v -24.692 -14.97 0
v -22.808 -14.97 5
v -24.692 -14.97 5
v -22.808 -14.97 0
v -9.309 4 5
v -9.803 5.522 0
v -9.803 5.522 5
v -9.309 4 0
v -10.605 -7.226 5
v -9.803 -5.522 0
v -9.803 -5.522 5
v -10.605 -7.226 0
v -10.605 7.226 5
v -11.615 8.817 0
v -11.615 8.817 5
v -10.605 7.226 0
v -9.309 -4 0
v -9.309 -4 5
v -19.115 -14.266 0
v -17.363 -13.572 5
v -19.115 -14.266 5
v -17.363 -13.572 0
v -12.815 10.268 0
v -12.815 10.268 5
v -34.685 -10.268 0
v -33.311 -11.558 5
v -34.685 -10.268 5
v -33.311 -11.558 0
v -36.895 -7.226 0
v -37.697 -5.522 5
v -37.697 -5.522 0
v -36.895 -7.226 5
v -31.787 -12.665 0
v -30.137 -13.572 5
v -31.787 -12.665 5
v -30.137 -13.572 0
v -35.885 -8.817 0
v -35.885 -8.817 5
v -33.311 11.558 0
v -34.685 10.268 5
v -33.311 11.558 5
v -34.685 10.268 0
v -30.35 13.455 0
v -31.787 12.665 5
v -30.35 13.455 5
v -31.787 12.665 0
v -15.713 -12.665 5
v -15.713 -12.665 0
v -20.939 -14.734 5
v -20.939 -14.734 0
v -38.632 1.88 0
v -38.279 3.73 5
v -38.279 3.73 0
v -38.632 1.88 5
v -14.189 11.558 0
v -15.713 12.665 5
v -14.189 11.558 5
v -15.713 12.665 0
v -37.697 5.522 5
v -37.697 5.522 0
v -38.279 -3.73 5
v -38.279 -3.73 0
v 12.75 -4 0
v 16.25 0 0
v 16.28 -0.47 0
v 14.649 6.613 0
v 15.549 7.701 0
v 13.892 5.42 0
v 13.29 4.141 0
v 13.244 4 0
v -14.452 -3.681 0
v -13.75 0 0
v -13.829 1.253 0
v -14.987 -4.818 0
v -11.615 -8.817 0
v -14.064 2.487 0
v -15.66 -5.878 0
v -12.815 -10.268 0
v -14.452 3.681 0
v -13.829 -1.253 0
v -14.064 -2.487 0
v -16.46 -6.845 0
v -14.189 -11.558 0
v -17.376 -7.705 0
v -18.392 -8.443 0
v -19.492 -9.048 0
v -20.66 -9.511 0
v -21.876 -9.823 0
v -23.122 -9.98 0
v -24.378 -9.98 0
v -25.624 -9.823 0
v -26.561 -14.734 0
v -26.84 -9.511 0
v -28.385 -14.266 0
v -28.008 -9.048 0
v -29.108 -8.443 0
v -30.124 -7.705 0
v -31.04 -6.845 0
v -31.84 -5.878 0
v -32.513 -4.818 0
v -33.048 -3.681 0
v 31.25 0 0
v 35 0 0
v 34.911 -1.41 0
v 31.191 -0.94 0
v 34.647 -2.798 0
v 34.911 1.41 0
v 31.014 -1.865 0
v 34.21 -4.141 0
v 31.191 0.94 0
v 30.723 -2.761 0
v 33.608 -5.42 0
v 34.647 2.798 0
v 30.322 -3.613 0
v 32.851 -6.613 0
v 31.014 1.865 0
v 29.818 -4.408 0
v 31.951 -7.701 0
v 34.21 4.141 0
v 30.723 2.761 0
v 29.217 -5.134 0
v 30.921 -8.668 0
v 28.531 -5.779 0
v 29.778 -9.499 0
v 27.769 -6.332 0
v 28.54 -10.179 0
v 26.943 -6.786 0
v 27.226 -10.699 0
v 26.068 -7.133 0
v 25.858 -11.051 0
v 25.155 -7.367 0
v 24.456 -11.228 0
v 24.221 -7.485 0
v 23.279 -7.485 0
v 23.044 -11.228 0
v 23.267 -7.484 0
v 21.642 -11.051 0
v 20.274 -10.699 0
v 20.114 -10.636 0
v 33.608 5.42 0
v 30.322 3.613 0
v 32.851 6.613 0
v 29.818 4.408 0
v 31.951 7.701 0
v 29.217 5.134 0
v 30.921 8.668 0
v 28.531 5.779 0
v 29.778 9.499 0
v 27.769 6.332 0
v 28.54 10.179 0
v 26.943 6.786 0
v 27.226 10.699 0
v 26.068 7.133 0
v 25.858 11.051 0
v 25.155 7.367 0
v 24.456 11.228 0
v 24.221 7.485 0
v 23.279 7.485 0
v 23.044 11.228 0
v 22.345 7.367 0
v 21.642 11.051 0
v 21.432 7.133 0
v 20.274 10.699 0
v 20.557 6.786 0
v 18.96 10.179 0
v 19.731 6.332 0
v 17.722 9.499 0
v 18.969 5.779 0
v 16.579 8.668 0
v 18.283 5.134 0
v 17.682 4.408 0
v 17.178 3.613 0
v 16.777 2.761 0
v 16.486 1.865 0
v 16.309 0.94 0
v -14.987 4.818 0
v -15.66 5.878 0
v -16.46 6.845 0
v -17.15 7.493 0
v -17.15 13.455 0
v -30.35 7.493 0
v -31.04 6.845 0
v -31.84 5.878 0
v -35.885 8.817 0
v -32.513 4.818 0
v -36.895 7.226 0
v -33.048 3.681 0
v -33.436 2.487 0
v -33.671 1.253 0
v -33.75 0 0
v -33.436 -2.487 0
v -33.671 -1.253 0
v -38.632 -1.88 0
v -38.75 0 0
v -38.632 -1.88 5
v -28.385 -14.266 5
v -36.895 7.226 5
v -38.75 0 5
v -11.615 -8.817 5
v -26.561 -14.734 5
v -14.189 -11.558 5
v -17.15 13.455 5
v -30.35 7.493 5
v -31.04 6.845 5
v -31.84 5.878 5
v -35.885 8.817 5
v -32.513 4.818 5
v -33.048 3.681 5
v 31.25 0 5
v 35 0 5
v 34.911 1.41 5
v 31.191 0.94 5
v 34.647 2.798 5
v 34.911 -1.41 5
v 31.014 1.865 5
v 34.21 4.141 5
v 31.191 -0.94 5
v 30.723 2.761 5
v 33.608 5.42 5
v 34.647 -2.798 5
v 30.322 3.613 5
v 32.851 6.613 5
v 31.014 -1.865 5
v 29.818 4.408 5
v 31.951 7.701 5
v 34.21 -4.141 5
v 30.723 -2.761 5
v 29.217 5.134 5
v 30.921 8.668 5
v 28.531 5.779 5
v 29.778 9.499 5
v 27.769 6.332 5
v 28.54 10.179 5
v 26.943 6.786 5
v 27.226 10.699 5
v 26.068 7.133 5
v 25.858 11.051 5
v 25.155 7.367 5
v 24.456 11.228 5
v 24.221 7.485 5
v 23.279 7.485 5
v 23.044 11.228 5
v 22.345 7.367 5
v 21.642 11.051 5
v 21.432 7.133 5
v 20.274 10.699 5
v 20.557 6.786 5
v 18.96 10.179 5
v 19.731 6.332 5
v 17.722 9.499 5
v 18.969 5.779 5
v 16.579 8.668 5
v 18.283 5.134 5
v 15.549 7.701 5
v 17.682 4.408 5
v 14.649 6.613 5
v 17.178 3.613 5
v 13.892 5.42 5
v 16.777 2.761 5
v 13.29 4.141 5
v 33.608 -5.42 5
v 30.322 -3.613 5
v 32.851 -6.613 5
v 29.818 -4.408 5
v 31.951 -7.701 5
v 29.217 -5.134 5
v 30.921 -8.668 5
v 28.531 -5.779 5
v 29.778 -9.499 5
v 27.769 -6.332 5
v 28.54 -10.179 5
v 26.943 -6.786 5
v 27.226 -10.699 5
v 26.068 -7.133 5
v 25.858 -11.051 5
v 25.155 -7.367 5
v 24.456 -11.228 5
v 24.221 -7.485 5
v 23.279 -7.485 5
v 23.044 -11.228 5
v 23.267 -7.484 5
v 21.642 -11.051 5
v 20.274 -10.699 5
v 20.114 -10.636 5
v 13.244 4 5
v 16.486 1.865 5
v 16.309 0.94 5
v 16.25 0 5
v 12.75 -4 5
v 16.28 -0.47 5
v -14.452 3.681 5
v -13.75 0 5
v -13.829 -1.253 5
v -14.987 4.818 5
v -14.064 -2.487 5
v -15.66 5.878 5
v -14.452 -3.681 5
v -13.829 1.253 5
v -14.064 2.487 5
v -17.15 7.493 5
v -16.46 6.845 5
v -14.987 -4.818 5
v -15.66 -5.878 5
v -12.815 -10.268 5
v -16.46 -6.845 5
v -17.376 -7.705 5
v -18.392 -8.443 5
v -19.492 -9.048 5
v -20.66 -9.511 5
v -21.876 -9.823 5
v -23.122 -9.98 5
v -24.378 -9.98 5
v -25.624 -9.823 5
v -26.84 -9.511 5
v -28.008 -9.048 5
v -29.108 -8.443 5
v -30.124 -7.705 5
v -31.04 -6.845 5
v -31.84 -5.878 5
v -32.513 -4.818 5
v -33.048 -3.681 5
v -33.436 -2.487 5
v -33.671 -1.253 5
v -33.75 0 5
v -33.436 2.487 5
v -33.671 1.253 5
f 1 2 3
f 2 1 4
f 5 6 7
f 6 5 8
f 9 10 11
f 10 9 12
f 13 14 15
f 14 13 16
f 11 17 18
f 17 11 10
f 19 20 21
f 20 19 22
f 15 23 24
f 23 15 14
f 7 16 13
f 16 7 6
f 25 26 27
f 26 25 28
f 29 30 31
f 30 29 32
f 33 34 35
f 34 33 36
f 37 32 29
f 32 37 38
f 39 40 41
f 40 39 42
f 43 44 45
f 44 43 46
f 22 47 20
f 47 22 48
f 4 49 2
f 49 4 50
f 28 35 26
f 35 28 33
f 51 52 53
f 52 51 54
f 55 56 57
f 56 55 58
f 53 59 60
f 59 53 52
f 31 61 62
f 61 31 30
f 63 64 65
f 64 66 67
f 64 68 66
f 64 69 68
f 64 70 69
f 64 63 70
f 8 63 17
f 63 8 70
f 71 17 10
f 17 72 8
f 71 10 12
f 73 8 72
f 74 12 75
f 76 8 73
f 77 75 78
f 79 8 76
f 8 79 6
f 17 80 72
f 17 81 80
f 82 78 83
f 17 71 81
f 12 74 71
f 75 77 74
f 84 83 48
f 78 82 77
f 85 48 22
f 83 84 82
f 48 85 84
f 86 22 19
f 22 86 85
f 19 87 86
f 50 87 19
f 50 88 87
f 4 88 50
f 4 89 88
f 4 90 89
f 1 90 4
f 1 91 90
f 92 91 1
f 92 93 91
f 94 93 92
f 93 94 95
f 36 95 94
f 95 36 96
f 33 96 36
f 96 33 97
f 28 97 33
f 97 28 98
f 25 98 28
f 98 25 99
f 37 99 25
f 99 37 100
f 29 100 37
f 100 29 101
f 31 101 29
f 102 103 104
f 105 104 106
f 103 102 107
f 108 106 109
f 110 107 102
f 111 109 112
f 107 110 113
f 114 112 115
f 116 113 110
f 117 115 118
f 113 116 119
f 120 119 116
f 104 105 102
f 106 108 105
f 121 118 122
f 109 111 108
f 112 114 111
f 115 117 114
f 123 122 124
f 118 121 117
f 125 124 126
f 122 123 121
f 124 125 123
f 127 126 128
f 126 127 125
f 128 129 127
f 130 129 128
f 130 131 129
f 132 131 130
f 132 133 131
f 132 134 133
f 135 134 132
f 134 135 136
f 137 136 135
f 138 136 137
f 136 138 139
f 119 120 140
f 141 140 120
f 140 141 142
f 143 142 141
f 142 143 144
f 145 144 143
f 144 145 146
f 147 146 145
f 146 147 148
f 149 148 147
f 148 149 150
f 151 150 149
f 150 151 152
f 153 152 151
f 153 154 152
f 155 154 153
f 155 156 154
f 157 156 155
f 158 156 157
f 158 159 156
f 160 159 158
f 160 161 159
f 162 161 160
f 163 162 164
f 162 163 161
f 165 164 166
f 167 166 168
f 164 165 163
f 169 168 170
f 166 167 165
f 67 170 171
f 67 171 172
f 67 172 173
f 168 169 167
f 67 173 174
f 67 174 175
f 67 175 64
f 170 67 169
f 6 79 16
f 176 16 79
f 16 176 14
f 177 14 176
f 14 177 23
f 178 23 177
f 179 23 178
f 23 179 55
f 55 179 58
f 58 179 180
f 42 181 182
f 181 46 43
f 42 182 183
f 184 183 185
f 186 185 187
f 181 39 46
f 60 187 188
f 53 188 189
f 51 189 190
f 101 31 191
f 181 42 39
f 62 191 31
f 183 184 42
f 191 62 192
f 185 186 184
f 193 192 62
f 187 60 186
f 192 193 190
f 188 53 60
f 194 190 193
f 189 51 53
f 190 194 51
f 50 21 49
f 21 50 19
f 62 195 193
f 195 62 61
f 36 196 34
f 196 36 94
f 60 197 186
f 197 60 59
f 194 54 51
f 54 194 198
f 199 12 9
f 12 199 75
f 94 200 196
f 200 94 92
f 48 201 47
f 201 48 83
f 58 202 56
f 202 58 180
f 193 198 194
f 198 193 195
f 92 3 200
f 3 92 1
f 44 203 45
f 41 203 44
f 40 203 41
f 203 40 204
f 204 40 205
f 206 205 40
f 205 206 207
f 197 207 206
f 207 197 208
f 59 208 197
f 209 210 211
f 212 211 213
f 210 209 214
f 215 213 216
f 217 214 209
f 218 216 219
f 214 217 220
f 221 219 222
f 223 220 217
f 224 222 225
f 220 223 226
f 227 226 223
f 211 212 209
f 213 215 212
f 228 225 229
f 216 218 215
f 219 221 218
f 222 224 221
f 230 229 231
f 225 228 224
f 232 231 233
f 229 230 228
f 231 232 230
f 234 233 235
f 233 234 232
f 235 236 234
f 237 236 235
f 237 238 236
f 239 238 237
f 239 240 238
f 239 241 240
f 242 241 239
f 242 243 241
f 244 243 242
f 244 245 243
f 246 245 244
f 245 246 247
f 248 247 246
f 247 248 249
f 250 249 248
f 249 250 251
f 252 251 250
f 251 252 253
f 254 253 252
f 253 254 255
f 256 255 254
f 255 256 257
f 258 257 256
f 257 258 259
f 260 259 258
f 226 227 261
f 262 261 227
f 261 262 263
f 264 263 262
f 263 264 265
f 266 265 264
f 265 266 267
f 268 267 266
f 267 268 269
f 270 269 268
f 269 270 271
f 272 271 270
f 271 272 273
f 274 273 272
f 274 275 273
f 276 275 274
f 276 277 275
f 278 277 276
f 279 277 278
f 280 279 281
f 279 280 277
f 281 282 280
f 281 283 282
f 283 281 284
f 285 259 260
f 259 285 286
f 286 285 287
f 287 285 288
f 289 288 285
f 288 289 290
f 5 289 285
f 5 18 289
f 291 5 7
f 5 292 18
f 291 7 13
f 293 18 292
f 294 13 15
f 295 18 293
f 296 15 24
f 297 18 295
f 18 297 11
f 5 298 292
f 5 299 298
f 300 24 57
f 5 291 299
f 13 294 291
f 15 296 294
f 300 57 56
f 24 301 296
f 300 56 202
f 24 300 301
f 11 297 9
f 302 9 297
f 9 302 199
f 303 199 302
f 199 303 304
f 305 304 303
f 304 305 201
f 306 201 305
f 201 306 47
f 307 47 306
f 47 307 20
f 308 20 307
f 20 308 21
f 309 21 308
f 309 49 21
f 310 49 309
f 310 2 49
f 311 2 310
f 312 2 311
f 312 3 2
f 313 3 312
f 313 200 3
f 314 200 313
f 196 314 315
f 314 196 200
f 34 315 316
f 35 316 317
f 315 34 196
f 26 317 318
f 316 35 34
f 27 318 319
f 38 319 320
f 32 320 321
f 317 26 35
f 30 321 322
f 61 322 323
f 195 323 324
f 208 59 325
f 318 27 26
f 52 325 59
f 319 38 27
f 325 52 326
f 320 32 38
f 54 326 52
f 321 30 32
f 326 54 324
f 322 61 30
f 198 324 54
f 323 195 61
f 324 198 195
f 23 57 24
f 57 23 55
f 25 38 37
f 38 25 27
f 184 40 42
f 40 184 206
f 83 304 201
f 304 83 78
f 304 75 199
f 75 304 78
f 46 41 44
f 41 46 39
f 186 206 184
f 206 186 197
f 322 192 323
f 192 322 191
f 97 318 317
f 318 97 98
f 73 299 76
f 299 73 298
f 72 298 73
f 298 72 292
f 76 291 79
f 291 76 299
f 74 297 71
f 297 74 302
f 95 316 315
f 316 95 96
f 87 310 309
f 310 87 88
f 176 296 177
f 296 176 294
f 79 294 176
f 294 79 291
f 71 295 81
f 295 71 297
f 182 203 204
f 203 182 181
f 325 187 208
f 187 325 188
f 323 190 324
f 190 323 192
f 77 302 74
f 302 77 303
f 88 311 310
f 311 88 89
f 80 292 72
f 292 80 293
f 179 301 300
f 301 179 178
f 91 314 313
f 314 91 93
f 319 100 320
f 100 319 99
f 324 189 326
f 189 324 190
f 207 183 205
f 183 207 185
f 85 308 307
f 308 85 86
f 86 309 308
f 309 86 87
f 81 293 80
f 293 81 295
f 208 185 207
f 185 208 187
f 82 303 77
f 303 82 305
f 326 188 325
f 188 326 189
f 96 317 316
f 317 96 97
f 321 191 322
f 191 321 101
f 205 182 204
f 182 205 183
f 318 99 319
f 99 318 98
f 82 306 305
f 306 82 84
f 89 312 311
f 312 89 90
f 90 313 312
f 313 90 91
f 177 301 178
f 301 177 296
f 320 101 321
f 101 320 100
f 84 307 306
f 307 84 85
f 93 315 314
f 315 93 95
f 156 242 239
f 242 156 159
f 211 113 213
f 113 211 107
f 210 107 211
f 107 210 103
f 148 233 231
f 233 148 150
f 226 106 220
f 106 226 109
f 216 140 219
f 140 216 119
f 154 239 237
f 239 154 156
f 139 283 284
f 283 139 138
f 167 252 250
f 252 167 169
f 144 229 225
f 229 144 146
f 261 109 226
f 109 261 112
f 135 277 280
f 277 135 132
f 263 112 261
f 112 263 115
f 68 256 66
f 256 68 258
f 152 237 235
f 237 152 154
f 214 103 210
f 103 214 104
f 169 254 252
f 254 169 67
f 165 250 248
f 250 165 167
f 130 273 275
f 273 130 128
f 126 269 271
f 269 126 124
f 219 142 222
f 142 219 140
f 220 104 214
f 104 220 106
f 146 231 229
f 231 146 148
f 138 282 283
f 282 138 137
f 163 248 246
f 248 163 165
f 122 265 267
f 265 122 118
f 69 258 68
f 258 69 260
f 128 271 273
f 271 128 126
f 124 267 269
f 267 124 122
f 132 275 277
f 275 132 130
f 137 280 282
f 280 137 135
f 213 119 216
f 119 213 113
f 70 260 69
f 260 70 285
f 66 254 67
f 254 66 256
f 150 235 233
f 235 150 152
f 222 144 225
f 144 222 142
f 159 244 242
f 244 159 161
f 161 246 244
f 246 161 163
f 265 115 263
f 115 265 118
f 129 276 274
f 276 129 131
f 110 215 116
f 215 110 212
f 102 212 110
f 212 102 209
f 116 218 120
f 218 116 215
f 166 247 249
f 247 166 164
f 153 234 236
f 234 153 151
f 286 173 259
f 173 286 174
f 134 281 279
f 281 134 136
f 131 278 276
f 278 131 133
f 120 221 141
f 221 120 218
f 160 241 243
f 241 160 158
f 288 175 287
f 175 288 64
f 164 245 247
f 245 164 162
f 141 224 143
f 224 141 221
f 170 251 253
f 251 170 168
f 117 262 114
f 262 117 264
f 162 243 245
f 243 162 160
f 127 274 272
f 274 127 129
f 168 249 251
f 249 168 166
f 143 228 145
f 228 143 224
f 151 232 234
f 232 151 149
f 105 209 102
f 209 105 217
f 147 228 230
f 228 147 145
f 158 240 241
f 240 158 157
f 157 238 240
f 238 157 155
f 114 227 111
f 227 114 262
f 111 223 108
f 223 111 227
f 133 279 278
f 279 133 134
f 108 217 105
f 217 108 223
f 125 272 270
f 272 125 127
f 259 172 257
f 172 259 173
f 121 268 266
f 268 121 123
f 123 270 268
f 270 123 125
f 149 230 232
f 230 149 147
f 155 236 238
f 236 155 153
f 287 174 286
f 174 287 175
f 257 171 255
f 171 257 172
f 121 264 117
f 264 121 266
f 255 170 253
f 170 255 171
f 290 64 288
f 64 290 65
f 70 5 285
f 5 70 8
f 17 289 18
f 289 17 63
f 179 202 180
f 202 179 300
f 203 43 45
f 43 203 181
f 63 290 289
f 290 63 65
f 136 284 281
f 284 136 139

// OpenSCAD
// A highly customizable S-Hook
// http://6brueder.wordpress.com
// October 2013
// Public Domain - Creative Commons CC0 1.0

// Inner diameter of the first ring
diameter_1              = 20;	// [1:200]

// Inner diameter of the second ring
diameter_2              = 15;	// [1:200]

// Distance between both rings
distance_type           = 1;	// [1:Manual distance,2:Closest distance]

// Only be used when "Distance Type = Manual distance"
manual_distance         = 30;	// [1:300]

// Strength of the rings, % in relation to the larger diameter
ring_strength           = 25;	// [1:100]

shape                   = 1;	// [1:S-Shape,2:3-Shape]

/* [Vents] */
vent_1_rotation         = 0;	// [-90:45]
vent_2_rotation         = 45;	// [-90:45]

// Size of the first vent in % in relation to the larger diameter
vent_1_strength         = 66;	// [1:100] 

// Size of the second vent in % in relation to the smaller diameter
vent_2_strength         = 66;	// [1:100]


// Calculations
large                   = diameter_1 > diameter_2 ? diameter_1 : diameter_2;
small                   = diameter_1 > diameter_2 ? diameter_2 : diameter_1;
ring_strength_normalized= ring_strength / 100;
global_height           = large * ring_strength_normalized;


// Distance
real_manual_distance    = manual_distance + diameter_1 / 2 + diameter_2 / 2;
closest_distance			= large / 2 + small / 2 + global_height;
distance_normalized     = distance_type == 1 ? real_manual_distance : closest_distance;


// Vents
vent_size_1             = large * (vent_1_strength / 100);
vent_size_2             = small * (vent_2_strength / 100);

shape_normalized        = shape;

vent_2_rotation_calc    = (shape_normalized == 1) ? (-vent_2_rotation + 180) : vent_2_rotation;


// Ring module
module ring(inner_diameter) {
    ring_size = inner_diameter * ring_strength_normalized;

    difference() {
        cylinder(h = global_height, r = (inner_diameter/2) + ring_size);
        translate([0,0,-0.1]) cylinder(h = global_height + 0.2, r = (inner_diameter/2));
    }
}


translate([-distance_normalized/2,0,0]) {
	difference() {
	    union() {
	        // First ring
	        ring(large);
	        
	        // Second ring
	        translate ([distance_normalized,0,0]) ring(small);
	        
	        
	        difference() {
	            // Connection bar
	            translate([0,-global_height * 1.6/2,0]) cube([distance_normalized, global_height * 1.6, global_height]);
	            
	            // The holes
	            union() {
	                translate([0,0,-0.1]) cylinder(h = global_height + 0.2, r = (large/2));
	                translate([distance_normalized,0,-0.1]) cylinder(h = global_height + 0.2, r = (small/2));
	            }
	        }
	    }
	    
	    // Vents
	    union() {
	         rotate(-vent_1_rotation) translate([-vent_size_1/2,0,-0.1]) cube([vent_size_1, large/2 + global_height + 1, global_height + 0.2]);
	
	        translate ([distance_normalized,0,0]) {
	            rotate(vent_2_rotation_calc) translate([-vent_size_2/2,0,-0.1]) cube([vent_size_2, small/2 + global_height + 1, global_height + 0.2]);
	        }
	    }
	}
}

//preview[view:east,tilt:top]
$fn = 50;
